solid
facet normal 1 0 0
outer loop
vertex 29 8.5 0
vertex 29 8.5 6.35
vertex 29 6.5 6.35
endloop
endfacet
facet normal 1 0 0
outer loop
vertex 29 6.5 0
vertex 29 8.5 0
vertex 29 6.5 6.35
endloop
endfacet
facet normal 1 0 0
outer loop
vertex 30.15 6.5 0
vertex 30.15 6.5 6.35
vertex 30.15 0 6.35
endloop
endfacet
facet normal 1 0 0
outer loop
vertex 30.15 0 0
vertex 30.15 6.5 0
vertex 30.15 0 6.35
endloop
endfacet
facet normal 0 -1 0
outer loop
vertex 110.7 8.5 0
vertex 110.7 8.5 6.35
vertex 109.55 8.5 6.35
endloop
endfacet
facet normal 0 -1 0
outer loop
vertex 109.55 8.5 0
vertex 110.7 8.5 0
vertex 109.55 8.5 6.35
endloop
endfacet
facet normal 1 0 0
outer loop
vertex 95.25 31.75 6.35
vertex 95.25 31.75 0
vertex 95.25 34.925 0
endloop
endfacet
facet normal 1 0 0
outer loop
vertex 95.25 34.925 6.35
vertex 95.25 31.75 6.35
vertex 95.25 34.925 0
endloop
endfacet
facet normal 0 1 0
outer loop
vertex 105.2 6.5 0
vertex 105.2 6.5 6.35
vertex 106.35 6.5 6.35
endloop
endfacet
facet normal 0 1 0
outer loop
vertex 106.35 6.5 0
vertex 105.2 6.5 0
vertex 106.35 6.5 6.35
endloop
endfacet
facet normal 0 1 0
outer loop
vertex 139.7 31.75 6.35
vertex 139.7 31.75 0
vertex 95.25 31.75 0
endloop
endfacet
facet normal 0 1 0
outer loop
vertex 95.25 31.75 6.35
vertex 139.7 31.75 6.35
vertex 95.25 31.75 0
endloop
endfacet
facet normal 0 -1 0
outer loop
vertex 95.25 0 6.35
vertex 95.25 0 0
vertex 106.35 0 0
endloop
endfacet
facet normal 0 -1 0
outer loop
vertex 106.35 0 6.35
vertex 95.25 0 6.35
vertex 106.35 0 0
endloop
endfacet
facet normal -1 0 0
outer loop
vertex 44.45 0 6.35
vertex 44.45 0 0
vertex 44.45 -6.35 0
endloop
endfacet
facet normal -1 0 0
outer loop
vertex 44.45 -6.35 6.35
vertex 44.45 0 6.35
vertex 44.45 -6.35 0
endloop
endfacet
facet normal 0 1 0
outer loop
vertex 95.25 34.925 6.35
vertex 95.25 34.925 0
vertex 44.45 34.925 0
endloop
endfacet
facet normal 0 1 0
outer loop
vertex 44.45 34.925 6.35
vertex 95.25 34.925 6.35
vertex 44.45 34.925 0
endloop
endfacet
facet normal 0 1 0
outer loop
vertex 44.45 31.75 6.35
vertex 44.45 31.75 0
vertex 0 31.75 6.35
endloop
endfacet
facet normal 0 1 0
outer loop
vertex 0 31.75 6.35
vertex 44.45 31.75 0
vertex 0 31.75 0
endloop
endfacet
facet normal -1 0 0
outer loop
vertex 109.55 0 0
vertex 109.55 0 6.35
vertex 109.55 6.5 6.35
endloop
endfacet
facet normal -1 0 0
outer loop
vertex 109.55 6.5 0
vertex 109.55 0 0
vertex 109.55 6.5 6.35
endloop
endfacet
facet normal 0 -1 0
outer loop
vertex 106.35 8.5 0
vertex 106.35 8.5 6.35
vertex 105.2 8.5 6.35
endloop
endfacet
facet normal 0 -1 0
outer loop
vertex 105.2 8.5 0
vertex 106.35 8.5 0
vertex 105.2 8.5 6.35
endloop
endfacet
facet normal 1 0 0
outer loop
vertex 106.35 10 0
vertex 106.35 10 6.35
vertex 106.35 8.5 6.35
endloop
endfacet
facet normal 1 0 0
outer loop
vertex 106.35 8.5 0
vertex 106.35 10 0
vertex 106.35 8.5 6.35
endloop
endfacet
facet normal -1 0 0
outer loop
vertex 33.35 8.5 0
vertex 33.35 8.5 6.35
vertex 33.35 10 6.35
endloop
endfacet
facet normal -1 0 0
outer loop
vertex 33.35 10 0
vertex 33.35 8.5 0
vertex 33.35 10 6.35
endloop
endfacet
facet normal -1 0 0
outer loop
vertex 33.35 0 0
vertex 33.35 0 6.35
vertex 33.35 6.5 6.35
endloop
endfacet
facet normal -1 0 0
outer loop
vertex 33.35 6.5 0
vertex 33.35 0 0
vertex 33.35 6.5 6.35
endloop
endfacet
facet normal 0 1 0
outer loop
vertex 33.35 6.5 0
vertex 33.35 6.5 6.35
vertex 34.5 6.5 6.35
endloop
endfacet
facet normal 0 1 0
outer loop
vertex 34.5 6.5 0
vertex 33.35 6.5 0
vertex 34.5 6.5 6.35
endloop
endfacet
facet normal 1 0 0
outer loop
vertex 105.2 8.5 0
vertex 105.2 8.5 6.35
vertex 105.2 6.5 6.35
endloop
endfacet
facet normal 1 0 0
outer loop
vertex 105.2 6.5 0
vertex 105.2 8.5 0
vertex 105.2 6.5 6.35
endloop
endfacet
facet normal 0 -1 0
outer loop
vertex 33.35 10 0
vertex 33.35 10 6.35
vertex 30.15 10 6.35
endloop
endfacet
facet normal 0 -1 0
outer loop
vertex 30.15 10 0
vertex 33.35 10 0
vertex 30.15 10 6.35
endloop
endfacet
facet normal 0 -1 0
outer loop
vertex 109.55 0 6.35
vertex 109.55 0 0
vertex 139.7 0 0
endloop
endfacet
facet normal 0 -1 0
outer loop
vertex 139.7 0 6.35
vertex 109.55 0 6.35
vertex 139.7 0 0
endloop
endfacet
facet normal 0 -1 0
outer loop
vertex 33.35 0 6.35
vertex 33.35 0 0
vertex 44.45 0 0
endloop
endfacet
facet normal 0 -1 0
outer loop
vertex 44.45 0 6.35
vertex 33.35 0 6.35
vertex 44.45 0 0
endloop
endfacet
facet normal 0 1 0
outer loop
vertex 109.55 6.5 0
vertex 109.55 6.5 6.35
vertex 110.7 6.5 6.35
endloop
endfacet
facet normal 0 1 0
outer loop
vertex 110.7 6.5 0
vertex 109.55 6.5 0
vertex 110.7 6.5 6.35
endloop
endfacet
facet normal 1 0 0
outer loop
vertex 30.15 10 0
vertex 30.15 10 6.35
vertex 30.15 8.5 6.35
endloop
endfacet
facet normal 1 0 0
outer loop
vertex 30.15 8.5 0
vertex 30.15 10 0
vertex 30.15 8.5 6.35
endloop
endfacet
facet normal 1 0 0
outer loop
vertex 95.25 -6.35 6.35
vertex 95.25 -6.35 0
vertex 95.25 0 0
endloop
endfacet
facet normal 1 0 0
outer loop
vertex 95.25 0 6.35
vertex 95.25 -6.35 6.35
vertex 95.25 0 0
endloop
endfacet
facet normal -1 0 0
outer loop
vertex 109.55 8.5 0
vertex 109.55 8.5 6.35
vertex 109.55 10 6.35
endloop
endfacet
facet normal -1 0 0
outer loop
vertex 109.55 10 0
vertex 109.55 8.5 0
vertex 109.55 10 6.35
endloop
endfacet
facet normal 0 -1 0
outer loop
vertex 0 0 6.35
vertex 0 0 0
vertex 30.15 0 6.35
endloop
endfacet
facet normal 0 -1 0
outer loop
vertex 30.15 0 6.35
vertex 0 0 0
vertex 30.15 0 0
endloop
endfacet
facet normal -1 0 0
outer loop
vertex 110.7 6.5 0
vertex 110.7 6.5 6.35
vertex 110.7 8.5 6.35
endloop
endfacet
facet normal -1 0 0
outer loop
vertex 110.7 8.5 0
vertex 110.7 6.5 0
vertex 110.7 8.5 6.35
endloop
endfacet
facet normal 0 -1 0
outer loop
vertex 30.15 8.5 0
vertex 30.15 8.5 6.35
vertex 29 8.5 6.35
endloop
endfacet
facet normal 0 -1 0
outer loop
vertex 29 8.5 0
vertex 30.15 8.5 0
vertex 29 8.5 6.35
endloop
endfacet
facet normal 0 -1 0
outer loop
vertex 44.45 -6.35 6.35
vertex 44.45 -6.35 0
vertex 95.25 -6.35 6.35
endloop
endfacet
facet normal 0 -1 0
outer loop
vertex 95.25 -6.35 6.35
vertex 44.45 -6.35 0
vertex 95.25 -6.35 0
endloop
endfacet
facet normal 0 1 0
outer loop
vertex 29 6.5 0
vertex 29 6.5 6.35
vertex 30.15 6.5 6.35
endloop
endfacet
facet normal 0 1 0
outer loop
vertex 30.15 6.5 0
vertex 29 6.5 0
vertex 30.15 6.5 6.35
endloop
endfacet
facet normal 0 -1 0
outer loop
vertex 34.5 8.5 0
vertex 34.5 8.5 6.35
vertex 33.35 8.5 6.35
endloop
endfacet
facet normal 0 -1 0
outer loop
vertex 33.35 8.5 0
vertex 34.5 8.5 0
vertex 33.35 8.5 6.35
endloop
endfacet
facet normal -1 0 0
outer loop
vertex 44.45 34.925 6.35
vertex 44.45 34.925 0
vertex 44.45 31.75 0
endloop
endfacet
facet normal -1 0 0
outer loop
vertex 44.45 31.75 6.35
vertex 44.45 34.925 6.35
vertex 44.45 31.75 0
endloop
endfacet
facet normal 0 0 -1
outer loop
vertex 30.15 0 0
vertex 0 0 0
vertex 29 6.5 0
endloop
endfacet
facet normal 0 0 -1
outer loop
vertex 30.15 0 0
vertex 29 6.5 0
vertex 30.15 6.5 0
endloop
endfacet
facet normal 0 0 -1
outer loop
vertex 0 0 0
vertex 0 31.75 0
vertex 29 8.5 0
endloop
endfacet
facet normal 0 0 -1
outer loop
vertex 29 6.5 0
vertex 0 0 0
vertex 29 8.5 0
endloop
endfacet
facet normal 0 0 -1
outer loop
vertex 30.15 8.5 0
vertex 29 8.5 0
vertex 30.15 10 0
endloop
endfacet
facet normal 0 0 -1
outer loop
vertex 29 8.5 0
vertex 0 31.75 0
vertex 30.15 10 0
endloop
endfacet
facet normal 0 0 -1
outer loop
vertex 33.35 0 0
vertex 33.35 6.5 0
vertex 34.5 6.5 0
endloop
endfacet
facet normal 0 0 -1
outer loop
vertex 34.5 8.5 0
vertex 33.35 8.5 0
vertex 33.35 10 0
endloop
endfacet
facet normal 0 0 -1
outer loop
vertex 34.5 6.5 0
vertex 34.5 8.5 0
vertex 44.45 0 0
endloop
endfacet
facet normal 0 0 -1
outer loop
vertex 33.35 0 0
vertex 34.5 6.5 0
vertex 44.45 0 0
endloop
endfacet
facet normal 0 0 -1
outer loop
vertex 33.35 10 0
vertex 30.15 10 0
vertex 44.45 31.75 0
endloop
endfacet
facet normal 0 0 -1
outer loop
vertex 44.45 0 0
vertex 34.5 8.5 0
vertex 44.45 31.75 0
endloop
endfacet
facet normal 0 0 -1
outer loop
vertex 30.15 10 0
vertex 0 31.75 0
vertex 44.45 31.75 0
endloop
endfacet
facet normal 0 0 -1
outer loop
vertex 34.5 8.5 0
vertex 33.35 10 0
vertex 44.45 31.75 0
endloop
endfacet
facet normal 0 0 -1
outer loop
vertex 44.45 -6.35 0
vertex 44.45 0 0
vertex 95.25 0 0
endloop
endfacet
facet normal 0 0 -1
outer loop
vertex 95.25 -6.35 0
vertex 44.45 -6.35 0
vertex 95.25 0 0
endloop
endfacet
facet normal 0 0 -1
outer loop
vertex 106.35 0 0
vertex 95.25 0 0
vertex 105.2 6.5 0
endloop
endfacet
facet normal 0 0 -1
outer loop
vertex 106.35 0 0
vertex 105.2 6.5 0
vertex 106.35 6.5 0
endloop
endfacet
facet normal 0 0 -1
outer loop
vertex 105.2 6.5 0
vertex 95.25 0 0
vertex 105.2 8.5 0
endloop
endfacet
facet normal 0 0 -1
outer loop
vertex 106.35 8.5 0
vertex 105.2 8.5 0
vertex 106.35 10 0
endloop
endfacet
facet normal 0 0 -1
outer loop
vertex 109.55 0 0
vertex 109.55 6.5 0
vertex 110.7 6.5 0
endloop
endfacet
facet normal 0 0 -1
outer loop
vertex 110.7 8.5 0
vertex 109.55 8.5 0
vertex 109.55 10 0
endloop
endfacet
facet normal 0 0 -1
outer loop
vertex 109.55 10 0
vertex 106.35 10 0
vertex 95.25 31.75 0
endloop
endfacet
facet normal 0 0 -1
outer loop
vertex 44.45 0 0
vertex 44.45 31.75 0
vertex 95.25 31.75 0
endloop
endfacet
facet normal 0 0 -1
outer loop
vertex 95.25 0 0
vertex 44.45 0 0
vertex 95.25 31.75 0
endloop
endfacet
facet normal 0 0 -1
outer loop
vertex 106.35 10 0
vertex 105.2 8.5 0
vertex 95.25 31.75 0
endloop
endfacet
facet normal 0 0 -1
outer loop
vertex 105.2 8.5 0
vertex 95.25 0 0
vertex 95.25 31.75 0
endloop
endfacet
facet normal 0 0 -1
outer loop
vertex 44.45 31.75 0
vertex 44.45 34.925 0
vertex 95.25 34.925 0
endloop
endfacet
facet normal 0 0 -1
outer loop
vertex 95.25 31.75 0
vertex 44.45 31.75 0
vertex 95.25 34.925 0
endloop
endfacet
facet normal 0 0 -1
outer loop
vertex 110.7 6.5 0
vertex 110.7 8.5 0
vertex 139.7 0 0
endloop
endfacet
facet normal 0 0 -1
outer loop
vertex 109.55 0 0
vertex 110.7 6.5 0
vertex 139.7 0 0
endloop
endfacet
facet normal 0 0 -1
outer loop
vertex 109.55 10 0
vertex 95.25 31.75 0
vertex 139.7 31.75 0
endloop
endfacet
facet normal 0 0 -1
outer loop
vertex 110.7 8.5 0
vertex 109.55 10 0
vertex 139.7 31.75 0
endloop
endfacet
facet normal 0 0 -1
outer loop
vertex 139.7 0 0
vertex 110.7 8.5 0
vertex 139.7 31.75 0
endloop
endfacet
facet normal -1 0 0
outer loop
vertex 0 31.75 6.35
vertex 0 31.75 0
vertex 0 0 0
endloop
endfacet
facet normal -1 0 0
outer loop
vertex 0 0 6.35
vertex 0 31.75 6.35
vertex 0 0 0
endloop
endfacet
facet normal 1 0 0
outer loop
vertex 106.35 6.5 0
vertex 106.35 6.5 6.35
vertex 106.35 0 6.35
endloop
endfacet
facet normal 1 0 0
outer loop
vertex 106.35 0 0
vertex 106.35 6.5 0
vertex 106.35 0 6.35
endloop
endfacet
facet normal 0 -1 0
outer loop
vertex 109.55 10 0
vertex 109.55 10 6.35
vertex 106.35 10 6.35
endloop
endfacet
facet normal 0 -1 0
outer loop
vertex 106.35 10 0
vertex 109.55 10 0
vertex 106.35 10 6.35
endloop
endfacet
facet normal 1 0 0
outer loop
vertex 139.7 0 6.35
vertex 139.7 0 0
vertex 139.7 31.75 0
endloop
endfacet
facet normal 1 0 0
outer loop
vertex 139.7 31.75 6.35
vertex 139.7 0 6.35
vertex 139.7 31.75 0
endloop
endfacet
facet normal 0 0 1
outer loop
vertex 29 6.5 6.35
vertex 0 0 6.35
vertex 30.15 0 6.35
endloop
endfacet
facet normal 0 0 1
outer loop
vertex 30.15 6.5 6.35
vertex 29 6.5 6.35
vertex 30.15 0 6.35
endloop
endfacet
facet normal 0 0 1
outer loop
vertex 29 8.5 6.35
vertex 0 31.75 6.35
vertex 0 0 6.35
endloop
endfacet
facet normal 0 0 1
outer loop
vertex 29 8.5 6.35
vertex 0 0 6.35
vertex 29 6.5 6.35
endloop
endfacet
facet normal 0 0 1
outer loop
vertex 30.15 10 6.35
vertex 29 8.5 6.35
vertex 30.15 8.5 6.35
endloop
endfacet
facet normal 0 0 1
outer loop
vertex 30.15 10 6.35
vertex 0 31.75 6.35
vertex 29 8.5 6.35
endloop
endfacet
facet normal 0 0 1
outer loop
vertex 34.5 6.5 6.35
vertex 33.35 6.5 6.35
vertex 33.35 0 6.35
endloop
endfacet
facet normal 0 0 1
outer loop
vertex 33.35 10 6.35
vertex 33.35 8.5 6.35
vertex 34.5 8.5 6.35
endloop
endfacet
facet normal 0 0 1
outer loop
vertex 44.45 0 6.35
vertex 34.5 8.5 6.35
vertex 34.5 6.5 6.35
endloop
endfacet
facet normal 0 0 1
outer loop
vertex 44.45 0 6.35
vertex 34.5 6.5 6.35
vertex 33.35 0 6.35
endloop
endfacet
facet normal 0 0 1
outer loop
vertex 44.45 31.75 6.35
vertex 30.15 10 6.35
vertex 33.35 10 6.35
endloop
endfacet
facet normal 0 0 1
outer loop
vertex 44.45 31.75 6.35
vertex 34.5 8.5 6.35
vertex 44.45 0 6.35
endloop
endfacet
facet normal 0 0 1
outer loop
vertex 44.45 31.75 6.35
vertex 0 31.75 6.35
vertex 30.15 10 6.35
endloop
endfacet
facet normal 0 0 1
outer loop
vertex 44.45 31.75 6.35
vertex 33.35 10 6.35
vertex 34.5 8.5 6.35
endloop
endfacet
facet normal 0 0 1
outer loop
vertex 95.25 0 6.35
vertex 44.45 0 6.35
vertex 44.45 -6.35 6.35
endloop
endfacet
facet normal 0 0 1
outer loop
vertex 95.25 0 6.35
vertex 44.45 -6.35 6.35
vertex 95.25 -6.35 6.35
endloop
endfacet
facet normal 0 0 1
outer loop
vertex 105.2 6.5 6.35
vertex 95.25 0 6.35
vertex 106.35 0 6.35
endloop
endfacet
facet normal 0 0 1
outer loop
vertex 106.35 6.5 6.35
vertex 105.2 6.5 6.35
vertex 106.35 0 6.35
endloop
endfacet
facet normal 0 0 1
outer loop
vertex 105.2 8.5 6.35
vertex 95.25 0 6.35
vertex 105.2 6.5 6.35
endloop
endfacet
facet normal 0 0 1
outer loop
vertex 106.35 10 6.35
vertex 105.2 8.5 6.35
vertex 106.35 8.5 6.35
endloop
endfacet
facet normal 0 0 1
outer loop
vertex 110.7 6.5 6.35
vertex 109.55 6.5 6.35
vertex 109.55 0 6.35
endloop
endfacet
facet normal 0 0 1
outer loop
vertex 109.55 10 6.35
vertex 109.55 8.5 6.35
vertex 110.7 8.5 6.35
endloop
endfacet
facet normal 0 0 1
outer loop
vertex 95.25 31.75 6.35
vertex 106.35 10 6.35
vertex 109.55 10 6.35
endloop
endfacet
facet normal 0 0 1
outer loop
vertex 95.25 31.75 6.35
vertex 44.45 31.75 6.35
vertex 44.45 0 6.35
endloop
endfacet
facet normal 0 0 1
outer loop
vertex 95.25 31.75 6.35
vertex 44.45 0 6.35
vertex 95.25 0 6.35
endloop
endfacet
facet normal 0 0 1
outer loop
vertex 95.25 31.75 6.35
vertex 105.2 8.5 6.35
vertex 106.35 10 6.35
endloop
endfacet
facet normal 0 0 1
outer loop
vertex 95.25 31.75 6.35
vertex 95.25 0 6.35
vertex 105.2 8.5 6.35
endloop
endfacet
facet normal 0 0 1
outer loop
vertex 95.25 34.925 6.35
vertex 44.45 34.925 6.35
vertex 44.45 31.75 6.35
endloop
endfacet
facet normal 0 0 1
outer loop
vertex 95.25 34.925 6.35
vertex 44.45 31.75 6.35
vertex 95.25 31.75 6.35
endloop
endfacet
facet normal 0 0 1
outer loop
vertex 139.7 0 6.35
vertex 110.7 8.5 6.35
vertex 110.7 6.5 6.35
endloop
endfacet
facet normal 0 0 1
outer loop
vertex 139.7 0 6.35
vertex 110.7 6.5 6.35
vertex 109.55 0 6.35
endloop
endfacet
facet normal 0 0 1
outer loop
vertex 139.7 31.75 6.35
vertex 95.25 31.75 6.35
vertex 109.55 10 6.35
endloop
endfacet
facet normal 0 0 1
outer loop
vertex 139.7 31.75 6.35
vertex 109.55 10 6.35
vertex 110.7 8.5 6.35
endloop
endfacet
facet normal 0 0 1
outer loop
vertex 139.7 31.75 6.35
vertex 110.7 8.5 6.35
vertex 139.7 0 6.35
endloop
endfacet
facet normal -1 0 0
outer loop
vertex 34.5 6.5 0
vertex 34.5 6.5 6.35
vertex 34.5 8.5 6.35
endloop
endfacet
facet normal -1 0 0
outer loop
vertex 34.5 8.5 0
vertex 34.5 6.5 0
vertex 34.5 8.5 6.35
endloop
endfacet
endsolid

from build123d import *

# Parameters (mm, degrees)
BOSS_EXTRUDE1_DEPTH = 6.35
CUT_EXTRUDE1_DEPTH  = 7.35


with BuildPart() as part:
    # Sketch1 → Boss-Extrude1 (new body)
    with BuildSketch(Plane.XY):
        Polygon((0, 0), (44.45, 0), (44.45, -6.35), (95.25, -6.35), (95.25, 0), (139.7, 0), (139.7, 31.75), (95.25, 31.75), (95.25, 34.925), (44.45, 34.925), (44.45, 31.75), (0, 31.75), align=None)
    extrude(amount=BOSS_EXTRUDE1_DEPTH)

    # Sketch2 → Cut-Extrude1 (cut, through all)
    with BuildSketch(Plane.XY.offset(6.35)):
        Polygon((30.15, 0), (33.35, 0), (33.35, 6.5), (34.5, 6.5), (34.5, 8.5), (33.35, 8.5), (33.35, 10), (30.15, 10), (30.15, 8.5), (29, 8.5), (29, 6.5), (30.15, 6.5), align=None)
        Polygon((109.55, 8.5), (109.55, 10), (106.35, 10), (106.35, 8.5), (105.2, 8.5), (105.2, 6.5), (106.35, 6.5), (106.35, 0), (109.55, 0), (109.55, 6.5), (110.7, 6.5), (110.7, 8.5), align=None)
    extrude(amount=-CUT_EXTRUDE1_DEPTH, mode=Mode.SUBTRACT)


solid = part.part
